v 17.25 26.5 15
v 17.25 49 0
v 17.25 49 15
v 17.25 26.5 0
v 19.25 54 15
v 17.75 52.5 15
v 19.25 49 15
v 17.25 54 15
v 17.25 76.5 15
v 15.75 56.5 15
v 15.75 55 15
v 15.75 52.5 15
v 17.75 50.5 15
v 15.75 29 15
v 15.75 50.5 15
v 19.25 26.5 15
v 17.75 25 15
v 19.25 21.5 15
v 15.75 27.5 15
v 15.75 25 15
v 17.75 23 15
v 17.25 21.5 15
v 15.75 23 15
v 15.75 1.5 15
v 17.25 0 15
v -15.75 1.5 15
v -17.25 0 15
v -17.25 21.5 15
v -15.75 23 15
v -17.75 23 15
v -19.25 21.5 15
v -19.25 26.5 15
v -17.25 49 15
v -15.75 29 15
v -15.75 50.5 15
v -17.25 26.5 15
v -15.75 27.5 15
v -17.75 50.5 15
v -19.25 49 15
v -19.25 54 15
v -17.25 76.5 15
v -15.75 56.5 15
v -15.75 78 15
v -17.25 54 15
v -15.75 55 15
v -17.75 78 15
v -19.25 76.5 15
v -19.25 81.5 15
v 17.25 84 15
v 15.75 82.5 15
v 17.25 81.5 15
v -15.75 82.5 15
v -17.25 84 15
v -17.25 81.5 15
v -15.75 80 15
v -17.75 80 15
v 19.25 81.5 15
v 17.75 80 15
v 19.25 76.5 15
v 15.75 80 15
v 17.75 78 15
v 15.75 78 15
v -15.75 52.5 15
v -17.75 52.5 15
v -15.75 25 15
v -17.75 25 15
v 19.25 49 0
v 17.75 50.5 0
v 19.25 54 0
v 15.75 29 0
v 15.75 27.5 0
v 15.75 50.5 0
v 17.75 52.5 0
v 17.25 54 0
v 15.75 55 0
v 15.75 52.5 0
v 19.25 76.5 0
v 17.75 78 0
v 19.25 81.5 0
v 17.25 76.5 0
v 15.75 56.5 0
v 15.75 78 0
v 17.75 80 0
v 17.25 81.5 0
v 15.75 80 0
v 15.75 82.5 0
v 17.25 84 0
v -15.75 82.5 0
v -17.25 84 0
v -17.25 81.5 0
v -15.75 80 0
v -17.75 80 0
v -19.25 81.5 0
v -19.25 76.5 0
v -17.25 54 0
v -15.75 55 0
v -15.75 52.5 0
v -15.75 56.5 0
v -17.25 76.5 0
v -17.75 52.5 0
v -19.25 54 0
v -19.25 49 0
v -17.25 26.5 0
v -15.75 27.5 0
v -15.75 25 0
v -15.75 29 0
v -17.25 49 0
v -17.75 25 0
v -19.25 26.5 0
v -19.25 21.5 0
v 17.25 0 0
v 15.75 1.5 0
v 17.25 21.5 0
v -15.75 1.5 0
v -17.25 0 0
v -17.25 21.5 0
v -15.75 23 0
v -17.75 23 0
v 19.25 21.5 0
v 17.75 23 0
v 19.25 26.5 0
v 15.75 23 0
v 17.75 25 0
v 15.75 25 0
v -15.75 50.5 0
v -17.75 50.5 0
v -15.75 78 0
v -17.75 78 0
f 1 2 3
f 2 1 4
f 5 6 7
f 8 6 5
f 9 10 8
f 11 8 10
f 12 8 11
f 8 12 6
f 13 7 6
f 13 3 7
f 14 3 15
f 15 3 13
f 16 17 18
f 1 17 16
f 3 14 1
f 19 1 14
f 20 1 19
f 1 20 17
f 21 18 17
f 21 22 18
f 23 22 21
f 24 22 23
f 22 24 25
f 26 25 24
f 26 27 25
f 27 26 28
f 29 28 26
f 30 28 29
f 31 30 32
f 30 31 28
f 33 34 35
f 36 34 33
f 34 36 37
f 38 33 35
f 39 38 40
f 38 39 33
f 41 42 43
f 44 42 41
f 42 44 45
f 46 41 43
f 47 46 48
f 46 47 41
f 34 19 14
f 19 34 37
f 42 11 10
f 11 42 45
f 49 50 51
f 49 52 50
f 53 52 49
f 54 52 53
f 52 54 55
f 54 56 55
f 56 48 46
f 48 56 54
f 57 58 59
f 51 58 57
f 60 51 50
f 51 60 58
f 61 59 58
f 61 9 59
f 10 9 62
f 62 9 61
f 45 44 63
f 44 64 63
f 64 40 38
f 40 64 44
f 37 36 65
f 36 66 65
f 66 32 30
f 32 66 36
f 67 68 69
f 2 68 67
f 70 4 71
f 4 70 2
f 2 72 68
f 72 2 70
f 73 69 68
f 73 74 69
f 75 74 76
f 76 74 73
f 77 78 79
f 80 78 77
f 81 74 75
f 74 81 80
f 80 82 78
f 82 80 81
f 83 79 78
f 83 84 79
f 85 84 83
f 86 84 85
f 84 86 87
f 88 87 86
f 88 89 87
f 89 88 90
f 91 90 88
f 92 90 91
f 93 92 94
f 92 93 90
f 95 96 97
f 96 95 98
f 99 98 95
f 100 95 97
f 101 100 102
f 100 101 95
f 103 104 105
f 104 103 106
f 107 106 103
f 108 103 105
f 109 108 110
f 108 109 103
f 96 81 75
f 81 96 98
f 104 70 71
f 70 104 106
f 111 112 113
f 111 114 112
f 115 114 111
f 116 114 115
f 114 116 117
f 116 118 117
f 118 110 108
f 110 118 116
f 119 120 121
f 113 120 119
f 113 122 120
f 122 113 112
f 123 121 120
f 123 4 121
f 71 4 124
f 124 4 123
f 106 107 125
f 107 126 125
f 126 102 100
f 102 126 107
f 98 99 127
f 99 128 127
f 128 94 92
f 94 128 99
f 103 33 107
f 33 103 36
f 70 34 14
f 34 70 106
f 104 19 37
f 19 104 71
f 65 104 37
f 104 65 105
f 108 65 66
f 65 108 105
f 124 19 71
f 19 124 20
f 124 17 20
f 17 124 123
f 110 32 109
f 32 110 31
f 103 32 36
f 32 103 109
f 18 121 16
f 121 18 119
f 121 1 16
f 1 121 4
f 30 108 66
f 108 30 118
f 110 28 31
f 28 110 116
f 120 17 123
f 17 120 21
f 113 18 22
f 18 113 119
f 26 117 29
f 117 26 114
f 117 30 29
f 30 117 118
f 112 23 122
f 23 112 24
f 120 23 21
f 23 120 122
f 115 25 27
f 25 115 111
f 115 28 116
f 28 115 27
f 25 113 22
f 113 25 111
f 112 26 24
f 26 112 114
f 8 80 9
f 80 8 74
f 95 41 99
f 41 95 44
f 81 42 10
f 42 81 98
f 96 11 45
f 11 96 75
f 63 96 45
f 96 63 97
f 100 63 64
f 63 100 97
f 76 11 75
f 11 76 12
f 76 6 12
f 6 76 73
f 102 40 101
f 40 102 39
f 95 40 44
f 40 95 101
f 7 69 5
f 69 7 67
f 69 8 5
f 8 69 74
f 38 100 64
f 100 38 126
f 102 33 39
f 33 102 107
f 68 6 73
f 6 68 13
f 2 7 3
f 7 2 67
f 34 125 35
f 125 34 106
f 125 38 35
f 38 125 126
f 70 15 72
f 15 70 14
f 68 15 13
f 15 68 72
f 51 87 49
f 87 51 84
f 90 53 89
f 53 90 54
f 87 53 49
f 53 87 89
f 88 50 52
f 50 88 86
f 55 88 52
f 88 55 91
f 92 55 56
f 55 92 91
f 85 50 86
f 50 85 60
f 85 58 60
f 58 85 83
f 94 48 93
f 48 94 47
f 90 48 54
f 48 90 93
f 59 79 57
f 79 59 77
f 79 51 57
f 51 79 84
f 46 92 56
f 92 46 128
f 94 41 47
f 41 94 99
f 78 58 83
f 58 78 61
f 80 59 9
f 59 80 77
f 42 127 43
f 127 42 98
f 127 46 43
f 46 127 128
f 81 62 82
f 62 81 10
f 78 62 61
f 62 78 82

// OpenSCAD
Thickness = 1.5; // All
Height = 15.0; // Z
Extra_Col_Spacing = 1.0;
Cols = 1;
Rows = 3;

module single(isFirst)
{
	Bucket_Base = 31.5; // X
	Bucket_Side = 26; // Y
	Lip_Offset = 2.5; // Y
	Lip_Opening_Size = 2.0; // Y
	Lip_Depth = 2.0; // X

	union()
	{
		if (isFirst)
		{

			union()
			{
				// Smaller support
				translate([0 - ((Bucket_Base / 2) + (((Lip_Depth * 2) + Extra_Col_Spacing + Thickness) / 2)), Bucket_Side - ((Lip_Offset + Thickness) / 2) + (Thickness * 2), (Height / 2)])
					cube([(Lip_Depth * 2) + Extra_Col_Spacing + Thickness, Lip_Offset + Thickness, Height], true);

				// Lip support
				translate([0 - ((Bucket_Base / 2) + (((Lip_Depth * 2) + Extra_Col_Spacing + Thickness) / 2)), (Bucket_Side + ((Lip_Opening_Size / 2) + Thickness)) - (Lip_Offset + Lip_Opening_Size), (Height / 2)])
					cube([((Lip_Depth * 2) + Extra_Col_Spacing + Thickness) - (Lip_Opening_Size * 2), Lip_Opening_Size + (Thickness * 2), Height], true);

				// Main support
				translate([0 - ((Bucket_Base / 2) + (((Lip_Depth * 2) + Extra_Col_Spacing + Thickness) / 2)), ((Bucket_Side + Thickness) - (Lip_Offset + Lip_Opening_Size)) / 2, (Height / 2)])
					cube([(Lip_Depth * 2) + Extra_Col_Spacing + Thickness, (Bucket_Side + Thickness) - (Lip_Offset + Lip_Opening_Size), Height], true);
			}
		}

		// Top
		translate([0, Bucket_Side + (Thickness * 1.5), (Height / 2)])
			cube([Bucket_Base + (Thickness * 2), Thickness, Height], true);

		// Top left of bucket
		translate([0 - ((Bucket_Base / 2) + (Thickness / 2)), (Bucket_Side - (Lip_Offset / 2)) + (Thickness * 1.5), (Height / 2)], true)
			cube([Thickness, Thickness + Lip_Offset, Height], true);

		// Top right of bucket
		translate([(Bucket_Base / 2) + (Thickness / 2), (Bucket_Side - (Lip_Offset / 2)) + (Thickness * 1.5), (Height / 2)], true)
			cube([Thickness, Thickness + Lip_Offset, Height], true);

		// Top left of lip
		translate([0 - ((Bucket_Base / 2) + ((Lip_Depth + Thickness) / 2)), (Bucket_Side - Lip_Offset) + (Thickness * 1.5), (Height / 2)])
			cube([Lip_Depth + Thickness, Thickness, Height], true);

		// Top right of lip
		translate([(Bucket_Base / 2) + ((Lip_Depth + Thickness) / 2), (Bucket_Side - Lip_Offset) + (Thickness * 1.5), (Height / 2)])
			cube([Lip_Depth + Thickness, Thickness, Height], true);

		// Left lip edge
		translate([0 - ((Bucket_Base / 2) + Lip_Depth + (Thickness / 2)), (Bucket_Side + ((Lip_Opening_Size / 2) + Thickness)) - (Lip_Offset + Lip_Opening_Size), (Height / 2)])
			cube([Thickness, Lip_Opening_Size + (Thickness * 2), Height], true);

		// Right lip edge
		translate([(Bucket_Base / 2) + Lip_Depth + (Thickness / 2), (Bucket_Side + ((Lip_Opening_Size / 2) + Thickness)) - (Lip_Offset + Lip_Opening_Size), (Height / 2)])
			cube([Thickness, Lip_Opening_Size + (Thickness * 2), Height], true);

		// Bottom left of lip
		translate([0 - ((Bucket_Base / 2) + ((Lip_Depth + Thickness) / 2)), ((Bucket_Side + (Thickness / 2)) - (Lip_Opening_Size + Lip_Offset)), (Height / 2)])
			cube([Lip_Depth + Thickness, Thickness, Height], true);

		// Bottom right of lip
		translate([(Bucket_Base / 2) + ((Lip_Depth + Thickness) / 2), ((Bucket_Side + (Thickness / 2)) - (Lip_Opening_Size + Lip_Offset)), (Height / 2)])
			cube([Lip_Depth + Thickness, Thickness, Height], true);

		// Bottom left
		translate([0 - ((Bucket_Base / 2) + (Thickness / 2)), (((Bucket_Side + Thickness) - (Lip_Opening_Size + Lip_Offset)) / 2), (Height / 2)])
			rotate([0, 0, 90])
				cube([((Bucket_Side + Thickness)- (Lip_Opening_Size + Lip_Offset)), Thickness, Height], true);

		// Bottom right
		translate([(Bucket_Base / 2) + (Thickness / 2), (((Bucket_Side + Thickness) - (Lip_Opening_Size + Lip_Offset)) / 2), (Height / 2)])
			rotate([0, 0, 90])
				cube([((Bucket_Side + Thickness) - (Lip_Opening_Size + Lip_Offset)), Thickness, Height], true);

		// Bottom
		translate([0, (Thickness / 2), (Height / 2)])
			cube([Bucket_Base + (Thickness * 2), Thickness, Height], true);
	}
}

module MakeCol(numRows, isFirst)
{
	//NOTE: Might want to double thickness here if you want thicker padding between rows
	Single_Height = 26.0 + Thickness;

	union()
	{
		for(i = [0:numRows - 1])
		{
			translate([0, i * Single_Height, 0])
				single(isFirst);
		}
	}
}

module Grid(numRows, numCols)
{
	Single_Width = 35.5 + Thickness + Extra_Col_Spacing;

	union()
	{
		for(i = [0:numCols - 1])
		{
			translate([i * Single_Width, 0, 0])
				MakeCol(numRows, (i > 0));
		}
	}
}

Grid(Rows, Cols);
single(false);
